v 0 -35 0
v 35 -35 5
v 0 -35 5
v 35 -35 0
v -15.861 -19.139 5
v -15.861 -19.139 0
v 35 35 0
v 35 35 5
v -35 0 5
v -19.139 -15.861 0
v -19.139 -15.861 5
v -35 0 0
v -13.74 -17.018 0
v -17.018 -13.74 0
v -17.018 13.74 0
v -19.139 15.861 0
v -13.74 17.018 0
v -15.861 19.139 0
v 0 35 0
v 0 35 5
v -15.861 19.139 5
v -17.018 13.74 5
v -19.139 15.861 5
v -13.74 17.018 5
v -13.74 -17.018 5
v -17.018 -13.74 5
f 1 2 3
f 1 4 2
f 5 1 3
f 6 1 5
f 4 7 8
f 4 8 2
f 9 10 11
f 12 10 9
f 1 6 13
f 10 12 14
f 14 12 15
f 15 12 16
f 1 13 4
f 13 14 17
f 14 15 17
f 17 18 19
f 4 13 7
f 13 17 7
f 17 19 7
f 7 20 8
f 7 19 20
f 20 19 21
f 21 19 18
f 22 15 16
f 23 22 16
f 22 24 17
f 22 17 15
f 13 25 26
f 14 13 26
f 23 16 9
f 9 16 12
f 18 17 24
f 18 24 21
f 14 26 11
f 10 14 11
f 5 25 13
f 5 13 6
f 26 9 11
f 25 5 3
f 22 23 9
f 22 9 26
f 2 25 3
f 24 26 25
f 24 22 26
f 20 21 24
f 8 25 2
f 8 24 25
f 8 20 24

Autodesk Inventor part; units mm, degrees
ref_plane "YZ Plane" through (0, 0, 0) normal (1, 0, 0) x (0, 1, 0)
ref_plane "XZ Plane" through (0, 0, 0) normal (0, 1, 0) x (-1, 0, 0)
ref_plane "XY Plane" through (0, 0, 0) normal (0, 0, 1) x (1, 0, 0)
sketch "Sketch1" plane through (0, 0, 0) normal (0, 0, 1) x (1, 0, 0)
  line L0 (0, 35) -> (35, 35)
  line L1 (35, 35) -> (35, -35)
  line L2 (0, -35) -> (-35, 0)
  line L3 (0, 35) -> (-35, 0)
  line L4 (35, -35) -> (0, -35)
  point P0 (0, 0)
  dimension "d1" = 70
extrude "Extrusion1" add sketch "Sketch1" along normal blind 5
sketch "Sketch2" plane through (0, 0, 5) normal (0, 0, 1) x (1, 0, 0)
  line L0 (0, 35) -> (-35, 0) projected
  line L1 (-35, 0) -> (0, -35) projected
  line L2 (-13.7396, 17.0178) -> (-15.8609, 19.1391)
  line L3 (-17.0178, 13.7396) -> (-19.1391, 15.8609)
  line L4 (-13.7396, 17.0178) -> (-17.0178, 13.7396)
  line L5 (0, 0) -> (-35, 0)
  line L6 (-13.7396, -17.0178) -> (-15.8609, -19.1391)
  line L7 (-17.0178, -13.7396) -> (-19.1391, -15.8609)
  line L8 (-13.7396, -17.0178) -> (-17.0178, -13.7396)
  line L9 (-15.8609, 19.1391) -> (-19.1391, 15.8609)
  line L10 (-19.1391, -15.8609) -> (-15.8609, -19.1391)
  dimension "d6" = 4.636
extrude "Extrusion2" cut sketch "Sketch2" against normal blind 5
properties part number "frame1"
